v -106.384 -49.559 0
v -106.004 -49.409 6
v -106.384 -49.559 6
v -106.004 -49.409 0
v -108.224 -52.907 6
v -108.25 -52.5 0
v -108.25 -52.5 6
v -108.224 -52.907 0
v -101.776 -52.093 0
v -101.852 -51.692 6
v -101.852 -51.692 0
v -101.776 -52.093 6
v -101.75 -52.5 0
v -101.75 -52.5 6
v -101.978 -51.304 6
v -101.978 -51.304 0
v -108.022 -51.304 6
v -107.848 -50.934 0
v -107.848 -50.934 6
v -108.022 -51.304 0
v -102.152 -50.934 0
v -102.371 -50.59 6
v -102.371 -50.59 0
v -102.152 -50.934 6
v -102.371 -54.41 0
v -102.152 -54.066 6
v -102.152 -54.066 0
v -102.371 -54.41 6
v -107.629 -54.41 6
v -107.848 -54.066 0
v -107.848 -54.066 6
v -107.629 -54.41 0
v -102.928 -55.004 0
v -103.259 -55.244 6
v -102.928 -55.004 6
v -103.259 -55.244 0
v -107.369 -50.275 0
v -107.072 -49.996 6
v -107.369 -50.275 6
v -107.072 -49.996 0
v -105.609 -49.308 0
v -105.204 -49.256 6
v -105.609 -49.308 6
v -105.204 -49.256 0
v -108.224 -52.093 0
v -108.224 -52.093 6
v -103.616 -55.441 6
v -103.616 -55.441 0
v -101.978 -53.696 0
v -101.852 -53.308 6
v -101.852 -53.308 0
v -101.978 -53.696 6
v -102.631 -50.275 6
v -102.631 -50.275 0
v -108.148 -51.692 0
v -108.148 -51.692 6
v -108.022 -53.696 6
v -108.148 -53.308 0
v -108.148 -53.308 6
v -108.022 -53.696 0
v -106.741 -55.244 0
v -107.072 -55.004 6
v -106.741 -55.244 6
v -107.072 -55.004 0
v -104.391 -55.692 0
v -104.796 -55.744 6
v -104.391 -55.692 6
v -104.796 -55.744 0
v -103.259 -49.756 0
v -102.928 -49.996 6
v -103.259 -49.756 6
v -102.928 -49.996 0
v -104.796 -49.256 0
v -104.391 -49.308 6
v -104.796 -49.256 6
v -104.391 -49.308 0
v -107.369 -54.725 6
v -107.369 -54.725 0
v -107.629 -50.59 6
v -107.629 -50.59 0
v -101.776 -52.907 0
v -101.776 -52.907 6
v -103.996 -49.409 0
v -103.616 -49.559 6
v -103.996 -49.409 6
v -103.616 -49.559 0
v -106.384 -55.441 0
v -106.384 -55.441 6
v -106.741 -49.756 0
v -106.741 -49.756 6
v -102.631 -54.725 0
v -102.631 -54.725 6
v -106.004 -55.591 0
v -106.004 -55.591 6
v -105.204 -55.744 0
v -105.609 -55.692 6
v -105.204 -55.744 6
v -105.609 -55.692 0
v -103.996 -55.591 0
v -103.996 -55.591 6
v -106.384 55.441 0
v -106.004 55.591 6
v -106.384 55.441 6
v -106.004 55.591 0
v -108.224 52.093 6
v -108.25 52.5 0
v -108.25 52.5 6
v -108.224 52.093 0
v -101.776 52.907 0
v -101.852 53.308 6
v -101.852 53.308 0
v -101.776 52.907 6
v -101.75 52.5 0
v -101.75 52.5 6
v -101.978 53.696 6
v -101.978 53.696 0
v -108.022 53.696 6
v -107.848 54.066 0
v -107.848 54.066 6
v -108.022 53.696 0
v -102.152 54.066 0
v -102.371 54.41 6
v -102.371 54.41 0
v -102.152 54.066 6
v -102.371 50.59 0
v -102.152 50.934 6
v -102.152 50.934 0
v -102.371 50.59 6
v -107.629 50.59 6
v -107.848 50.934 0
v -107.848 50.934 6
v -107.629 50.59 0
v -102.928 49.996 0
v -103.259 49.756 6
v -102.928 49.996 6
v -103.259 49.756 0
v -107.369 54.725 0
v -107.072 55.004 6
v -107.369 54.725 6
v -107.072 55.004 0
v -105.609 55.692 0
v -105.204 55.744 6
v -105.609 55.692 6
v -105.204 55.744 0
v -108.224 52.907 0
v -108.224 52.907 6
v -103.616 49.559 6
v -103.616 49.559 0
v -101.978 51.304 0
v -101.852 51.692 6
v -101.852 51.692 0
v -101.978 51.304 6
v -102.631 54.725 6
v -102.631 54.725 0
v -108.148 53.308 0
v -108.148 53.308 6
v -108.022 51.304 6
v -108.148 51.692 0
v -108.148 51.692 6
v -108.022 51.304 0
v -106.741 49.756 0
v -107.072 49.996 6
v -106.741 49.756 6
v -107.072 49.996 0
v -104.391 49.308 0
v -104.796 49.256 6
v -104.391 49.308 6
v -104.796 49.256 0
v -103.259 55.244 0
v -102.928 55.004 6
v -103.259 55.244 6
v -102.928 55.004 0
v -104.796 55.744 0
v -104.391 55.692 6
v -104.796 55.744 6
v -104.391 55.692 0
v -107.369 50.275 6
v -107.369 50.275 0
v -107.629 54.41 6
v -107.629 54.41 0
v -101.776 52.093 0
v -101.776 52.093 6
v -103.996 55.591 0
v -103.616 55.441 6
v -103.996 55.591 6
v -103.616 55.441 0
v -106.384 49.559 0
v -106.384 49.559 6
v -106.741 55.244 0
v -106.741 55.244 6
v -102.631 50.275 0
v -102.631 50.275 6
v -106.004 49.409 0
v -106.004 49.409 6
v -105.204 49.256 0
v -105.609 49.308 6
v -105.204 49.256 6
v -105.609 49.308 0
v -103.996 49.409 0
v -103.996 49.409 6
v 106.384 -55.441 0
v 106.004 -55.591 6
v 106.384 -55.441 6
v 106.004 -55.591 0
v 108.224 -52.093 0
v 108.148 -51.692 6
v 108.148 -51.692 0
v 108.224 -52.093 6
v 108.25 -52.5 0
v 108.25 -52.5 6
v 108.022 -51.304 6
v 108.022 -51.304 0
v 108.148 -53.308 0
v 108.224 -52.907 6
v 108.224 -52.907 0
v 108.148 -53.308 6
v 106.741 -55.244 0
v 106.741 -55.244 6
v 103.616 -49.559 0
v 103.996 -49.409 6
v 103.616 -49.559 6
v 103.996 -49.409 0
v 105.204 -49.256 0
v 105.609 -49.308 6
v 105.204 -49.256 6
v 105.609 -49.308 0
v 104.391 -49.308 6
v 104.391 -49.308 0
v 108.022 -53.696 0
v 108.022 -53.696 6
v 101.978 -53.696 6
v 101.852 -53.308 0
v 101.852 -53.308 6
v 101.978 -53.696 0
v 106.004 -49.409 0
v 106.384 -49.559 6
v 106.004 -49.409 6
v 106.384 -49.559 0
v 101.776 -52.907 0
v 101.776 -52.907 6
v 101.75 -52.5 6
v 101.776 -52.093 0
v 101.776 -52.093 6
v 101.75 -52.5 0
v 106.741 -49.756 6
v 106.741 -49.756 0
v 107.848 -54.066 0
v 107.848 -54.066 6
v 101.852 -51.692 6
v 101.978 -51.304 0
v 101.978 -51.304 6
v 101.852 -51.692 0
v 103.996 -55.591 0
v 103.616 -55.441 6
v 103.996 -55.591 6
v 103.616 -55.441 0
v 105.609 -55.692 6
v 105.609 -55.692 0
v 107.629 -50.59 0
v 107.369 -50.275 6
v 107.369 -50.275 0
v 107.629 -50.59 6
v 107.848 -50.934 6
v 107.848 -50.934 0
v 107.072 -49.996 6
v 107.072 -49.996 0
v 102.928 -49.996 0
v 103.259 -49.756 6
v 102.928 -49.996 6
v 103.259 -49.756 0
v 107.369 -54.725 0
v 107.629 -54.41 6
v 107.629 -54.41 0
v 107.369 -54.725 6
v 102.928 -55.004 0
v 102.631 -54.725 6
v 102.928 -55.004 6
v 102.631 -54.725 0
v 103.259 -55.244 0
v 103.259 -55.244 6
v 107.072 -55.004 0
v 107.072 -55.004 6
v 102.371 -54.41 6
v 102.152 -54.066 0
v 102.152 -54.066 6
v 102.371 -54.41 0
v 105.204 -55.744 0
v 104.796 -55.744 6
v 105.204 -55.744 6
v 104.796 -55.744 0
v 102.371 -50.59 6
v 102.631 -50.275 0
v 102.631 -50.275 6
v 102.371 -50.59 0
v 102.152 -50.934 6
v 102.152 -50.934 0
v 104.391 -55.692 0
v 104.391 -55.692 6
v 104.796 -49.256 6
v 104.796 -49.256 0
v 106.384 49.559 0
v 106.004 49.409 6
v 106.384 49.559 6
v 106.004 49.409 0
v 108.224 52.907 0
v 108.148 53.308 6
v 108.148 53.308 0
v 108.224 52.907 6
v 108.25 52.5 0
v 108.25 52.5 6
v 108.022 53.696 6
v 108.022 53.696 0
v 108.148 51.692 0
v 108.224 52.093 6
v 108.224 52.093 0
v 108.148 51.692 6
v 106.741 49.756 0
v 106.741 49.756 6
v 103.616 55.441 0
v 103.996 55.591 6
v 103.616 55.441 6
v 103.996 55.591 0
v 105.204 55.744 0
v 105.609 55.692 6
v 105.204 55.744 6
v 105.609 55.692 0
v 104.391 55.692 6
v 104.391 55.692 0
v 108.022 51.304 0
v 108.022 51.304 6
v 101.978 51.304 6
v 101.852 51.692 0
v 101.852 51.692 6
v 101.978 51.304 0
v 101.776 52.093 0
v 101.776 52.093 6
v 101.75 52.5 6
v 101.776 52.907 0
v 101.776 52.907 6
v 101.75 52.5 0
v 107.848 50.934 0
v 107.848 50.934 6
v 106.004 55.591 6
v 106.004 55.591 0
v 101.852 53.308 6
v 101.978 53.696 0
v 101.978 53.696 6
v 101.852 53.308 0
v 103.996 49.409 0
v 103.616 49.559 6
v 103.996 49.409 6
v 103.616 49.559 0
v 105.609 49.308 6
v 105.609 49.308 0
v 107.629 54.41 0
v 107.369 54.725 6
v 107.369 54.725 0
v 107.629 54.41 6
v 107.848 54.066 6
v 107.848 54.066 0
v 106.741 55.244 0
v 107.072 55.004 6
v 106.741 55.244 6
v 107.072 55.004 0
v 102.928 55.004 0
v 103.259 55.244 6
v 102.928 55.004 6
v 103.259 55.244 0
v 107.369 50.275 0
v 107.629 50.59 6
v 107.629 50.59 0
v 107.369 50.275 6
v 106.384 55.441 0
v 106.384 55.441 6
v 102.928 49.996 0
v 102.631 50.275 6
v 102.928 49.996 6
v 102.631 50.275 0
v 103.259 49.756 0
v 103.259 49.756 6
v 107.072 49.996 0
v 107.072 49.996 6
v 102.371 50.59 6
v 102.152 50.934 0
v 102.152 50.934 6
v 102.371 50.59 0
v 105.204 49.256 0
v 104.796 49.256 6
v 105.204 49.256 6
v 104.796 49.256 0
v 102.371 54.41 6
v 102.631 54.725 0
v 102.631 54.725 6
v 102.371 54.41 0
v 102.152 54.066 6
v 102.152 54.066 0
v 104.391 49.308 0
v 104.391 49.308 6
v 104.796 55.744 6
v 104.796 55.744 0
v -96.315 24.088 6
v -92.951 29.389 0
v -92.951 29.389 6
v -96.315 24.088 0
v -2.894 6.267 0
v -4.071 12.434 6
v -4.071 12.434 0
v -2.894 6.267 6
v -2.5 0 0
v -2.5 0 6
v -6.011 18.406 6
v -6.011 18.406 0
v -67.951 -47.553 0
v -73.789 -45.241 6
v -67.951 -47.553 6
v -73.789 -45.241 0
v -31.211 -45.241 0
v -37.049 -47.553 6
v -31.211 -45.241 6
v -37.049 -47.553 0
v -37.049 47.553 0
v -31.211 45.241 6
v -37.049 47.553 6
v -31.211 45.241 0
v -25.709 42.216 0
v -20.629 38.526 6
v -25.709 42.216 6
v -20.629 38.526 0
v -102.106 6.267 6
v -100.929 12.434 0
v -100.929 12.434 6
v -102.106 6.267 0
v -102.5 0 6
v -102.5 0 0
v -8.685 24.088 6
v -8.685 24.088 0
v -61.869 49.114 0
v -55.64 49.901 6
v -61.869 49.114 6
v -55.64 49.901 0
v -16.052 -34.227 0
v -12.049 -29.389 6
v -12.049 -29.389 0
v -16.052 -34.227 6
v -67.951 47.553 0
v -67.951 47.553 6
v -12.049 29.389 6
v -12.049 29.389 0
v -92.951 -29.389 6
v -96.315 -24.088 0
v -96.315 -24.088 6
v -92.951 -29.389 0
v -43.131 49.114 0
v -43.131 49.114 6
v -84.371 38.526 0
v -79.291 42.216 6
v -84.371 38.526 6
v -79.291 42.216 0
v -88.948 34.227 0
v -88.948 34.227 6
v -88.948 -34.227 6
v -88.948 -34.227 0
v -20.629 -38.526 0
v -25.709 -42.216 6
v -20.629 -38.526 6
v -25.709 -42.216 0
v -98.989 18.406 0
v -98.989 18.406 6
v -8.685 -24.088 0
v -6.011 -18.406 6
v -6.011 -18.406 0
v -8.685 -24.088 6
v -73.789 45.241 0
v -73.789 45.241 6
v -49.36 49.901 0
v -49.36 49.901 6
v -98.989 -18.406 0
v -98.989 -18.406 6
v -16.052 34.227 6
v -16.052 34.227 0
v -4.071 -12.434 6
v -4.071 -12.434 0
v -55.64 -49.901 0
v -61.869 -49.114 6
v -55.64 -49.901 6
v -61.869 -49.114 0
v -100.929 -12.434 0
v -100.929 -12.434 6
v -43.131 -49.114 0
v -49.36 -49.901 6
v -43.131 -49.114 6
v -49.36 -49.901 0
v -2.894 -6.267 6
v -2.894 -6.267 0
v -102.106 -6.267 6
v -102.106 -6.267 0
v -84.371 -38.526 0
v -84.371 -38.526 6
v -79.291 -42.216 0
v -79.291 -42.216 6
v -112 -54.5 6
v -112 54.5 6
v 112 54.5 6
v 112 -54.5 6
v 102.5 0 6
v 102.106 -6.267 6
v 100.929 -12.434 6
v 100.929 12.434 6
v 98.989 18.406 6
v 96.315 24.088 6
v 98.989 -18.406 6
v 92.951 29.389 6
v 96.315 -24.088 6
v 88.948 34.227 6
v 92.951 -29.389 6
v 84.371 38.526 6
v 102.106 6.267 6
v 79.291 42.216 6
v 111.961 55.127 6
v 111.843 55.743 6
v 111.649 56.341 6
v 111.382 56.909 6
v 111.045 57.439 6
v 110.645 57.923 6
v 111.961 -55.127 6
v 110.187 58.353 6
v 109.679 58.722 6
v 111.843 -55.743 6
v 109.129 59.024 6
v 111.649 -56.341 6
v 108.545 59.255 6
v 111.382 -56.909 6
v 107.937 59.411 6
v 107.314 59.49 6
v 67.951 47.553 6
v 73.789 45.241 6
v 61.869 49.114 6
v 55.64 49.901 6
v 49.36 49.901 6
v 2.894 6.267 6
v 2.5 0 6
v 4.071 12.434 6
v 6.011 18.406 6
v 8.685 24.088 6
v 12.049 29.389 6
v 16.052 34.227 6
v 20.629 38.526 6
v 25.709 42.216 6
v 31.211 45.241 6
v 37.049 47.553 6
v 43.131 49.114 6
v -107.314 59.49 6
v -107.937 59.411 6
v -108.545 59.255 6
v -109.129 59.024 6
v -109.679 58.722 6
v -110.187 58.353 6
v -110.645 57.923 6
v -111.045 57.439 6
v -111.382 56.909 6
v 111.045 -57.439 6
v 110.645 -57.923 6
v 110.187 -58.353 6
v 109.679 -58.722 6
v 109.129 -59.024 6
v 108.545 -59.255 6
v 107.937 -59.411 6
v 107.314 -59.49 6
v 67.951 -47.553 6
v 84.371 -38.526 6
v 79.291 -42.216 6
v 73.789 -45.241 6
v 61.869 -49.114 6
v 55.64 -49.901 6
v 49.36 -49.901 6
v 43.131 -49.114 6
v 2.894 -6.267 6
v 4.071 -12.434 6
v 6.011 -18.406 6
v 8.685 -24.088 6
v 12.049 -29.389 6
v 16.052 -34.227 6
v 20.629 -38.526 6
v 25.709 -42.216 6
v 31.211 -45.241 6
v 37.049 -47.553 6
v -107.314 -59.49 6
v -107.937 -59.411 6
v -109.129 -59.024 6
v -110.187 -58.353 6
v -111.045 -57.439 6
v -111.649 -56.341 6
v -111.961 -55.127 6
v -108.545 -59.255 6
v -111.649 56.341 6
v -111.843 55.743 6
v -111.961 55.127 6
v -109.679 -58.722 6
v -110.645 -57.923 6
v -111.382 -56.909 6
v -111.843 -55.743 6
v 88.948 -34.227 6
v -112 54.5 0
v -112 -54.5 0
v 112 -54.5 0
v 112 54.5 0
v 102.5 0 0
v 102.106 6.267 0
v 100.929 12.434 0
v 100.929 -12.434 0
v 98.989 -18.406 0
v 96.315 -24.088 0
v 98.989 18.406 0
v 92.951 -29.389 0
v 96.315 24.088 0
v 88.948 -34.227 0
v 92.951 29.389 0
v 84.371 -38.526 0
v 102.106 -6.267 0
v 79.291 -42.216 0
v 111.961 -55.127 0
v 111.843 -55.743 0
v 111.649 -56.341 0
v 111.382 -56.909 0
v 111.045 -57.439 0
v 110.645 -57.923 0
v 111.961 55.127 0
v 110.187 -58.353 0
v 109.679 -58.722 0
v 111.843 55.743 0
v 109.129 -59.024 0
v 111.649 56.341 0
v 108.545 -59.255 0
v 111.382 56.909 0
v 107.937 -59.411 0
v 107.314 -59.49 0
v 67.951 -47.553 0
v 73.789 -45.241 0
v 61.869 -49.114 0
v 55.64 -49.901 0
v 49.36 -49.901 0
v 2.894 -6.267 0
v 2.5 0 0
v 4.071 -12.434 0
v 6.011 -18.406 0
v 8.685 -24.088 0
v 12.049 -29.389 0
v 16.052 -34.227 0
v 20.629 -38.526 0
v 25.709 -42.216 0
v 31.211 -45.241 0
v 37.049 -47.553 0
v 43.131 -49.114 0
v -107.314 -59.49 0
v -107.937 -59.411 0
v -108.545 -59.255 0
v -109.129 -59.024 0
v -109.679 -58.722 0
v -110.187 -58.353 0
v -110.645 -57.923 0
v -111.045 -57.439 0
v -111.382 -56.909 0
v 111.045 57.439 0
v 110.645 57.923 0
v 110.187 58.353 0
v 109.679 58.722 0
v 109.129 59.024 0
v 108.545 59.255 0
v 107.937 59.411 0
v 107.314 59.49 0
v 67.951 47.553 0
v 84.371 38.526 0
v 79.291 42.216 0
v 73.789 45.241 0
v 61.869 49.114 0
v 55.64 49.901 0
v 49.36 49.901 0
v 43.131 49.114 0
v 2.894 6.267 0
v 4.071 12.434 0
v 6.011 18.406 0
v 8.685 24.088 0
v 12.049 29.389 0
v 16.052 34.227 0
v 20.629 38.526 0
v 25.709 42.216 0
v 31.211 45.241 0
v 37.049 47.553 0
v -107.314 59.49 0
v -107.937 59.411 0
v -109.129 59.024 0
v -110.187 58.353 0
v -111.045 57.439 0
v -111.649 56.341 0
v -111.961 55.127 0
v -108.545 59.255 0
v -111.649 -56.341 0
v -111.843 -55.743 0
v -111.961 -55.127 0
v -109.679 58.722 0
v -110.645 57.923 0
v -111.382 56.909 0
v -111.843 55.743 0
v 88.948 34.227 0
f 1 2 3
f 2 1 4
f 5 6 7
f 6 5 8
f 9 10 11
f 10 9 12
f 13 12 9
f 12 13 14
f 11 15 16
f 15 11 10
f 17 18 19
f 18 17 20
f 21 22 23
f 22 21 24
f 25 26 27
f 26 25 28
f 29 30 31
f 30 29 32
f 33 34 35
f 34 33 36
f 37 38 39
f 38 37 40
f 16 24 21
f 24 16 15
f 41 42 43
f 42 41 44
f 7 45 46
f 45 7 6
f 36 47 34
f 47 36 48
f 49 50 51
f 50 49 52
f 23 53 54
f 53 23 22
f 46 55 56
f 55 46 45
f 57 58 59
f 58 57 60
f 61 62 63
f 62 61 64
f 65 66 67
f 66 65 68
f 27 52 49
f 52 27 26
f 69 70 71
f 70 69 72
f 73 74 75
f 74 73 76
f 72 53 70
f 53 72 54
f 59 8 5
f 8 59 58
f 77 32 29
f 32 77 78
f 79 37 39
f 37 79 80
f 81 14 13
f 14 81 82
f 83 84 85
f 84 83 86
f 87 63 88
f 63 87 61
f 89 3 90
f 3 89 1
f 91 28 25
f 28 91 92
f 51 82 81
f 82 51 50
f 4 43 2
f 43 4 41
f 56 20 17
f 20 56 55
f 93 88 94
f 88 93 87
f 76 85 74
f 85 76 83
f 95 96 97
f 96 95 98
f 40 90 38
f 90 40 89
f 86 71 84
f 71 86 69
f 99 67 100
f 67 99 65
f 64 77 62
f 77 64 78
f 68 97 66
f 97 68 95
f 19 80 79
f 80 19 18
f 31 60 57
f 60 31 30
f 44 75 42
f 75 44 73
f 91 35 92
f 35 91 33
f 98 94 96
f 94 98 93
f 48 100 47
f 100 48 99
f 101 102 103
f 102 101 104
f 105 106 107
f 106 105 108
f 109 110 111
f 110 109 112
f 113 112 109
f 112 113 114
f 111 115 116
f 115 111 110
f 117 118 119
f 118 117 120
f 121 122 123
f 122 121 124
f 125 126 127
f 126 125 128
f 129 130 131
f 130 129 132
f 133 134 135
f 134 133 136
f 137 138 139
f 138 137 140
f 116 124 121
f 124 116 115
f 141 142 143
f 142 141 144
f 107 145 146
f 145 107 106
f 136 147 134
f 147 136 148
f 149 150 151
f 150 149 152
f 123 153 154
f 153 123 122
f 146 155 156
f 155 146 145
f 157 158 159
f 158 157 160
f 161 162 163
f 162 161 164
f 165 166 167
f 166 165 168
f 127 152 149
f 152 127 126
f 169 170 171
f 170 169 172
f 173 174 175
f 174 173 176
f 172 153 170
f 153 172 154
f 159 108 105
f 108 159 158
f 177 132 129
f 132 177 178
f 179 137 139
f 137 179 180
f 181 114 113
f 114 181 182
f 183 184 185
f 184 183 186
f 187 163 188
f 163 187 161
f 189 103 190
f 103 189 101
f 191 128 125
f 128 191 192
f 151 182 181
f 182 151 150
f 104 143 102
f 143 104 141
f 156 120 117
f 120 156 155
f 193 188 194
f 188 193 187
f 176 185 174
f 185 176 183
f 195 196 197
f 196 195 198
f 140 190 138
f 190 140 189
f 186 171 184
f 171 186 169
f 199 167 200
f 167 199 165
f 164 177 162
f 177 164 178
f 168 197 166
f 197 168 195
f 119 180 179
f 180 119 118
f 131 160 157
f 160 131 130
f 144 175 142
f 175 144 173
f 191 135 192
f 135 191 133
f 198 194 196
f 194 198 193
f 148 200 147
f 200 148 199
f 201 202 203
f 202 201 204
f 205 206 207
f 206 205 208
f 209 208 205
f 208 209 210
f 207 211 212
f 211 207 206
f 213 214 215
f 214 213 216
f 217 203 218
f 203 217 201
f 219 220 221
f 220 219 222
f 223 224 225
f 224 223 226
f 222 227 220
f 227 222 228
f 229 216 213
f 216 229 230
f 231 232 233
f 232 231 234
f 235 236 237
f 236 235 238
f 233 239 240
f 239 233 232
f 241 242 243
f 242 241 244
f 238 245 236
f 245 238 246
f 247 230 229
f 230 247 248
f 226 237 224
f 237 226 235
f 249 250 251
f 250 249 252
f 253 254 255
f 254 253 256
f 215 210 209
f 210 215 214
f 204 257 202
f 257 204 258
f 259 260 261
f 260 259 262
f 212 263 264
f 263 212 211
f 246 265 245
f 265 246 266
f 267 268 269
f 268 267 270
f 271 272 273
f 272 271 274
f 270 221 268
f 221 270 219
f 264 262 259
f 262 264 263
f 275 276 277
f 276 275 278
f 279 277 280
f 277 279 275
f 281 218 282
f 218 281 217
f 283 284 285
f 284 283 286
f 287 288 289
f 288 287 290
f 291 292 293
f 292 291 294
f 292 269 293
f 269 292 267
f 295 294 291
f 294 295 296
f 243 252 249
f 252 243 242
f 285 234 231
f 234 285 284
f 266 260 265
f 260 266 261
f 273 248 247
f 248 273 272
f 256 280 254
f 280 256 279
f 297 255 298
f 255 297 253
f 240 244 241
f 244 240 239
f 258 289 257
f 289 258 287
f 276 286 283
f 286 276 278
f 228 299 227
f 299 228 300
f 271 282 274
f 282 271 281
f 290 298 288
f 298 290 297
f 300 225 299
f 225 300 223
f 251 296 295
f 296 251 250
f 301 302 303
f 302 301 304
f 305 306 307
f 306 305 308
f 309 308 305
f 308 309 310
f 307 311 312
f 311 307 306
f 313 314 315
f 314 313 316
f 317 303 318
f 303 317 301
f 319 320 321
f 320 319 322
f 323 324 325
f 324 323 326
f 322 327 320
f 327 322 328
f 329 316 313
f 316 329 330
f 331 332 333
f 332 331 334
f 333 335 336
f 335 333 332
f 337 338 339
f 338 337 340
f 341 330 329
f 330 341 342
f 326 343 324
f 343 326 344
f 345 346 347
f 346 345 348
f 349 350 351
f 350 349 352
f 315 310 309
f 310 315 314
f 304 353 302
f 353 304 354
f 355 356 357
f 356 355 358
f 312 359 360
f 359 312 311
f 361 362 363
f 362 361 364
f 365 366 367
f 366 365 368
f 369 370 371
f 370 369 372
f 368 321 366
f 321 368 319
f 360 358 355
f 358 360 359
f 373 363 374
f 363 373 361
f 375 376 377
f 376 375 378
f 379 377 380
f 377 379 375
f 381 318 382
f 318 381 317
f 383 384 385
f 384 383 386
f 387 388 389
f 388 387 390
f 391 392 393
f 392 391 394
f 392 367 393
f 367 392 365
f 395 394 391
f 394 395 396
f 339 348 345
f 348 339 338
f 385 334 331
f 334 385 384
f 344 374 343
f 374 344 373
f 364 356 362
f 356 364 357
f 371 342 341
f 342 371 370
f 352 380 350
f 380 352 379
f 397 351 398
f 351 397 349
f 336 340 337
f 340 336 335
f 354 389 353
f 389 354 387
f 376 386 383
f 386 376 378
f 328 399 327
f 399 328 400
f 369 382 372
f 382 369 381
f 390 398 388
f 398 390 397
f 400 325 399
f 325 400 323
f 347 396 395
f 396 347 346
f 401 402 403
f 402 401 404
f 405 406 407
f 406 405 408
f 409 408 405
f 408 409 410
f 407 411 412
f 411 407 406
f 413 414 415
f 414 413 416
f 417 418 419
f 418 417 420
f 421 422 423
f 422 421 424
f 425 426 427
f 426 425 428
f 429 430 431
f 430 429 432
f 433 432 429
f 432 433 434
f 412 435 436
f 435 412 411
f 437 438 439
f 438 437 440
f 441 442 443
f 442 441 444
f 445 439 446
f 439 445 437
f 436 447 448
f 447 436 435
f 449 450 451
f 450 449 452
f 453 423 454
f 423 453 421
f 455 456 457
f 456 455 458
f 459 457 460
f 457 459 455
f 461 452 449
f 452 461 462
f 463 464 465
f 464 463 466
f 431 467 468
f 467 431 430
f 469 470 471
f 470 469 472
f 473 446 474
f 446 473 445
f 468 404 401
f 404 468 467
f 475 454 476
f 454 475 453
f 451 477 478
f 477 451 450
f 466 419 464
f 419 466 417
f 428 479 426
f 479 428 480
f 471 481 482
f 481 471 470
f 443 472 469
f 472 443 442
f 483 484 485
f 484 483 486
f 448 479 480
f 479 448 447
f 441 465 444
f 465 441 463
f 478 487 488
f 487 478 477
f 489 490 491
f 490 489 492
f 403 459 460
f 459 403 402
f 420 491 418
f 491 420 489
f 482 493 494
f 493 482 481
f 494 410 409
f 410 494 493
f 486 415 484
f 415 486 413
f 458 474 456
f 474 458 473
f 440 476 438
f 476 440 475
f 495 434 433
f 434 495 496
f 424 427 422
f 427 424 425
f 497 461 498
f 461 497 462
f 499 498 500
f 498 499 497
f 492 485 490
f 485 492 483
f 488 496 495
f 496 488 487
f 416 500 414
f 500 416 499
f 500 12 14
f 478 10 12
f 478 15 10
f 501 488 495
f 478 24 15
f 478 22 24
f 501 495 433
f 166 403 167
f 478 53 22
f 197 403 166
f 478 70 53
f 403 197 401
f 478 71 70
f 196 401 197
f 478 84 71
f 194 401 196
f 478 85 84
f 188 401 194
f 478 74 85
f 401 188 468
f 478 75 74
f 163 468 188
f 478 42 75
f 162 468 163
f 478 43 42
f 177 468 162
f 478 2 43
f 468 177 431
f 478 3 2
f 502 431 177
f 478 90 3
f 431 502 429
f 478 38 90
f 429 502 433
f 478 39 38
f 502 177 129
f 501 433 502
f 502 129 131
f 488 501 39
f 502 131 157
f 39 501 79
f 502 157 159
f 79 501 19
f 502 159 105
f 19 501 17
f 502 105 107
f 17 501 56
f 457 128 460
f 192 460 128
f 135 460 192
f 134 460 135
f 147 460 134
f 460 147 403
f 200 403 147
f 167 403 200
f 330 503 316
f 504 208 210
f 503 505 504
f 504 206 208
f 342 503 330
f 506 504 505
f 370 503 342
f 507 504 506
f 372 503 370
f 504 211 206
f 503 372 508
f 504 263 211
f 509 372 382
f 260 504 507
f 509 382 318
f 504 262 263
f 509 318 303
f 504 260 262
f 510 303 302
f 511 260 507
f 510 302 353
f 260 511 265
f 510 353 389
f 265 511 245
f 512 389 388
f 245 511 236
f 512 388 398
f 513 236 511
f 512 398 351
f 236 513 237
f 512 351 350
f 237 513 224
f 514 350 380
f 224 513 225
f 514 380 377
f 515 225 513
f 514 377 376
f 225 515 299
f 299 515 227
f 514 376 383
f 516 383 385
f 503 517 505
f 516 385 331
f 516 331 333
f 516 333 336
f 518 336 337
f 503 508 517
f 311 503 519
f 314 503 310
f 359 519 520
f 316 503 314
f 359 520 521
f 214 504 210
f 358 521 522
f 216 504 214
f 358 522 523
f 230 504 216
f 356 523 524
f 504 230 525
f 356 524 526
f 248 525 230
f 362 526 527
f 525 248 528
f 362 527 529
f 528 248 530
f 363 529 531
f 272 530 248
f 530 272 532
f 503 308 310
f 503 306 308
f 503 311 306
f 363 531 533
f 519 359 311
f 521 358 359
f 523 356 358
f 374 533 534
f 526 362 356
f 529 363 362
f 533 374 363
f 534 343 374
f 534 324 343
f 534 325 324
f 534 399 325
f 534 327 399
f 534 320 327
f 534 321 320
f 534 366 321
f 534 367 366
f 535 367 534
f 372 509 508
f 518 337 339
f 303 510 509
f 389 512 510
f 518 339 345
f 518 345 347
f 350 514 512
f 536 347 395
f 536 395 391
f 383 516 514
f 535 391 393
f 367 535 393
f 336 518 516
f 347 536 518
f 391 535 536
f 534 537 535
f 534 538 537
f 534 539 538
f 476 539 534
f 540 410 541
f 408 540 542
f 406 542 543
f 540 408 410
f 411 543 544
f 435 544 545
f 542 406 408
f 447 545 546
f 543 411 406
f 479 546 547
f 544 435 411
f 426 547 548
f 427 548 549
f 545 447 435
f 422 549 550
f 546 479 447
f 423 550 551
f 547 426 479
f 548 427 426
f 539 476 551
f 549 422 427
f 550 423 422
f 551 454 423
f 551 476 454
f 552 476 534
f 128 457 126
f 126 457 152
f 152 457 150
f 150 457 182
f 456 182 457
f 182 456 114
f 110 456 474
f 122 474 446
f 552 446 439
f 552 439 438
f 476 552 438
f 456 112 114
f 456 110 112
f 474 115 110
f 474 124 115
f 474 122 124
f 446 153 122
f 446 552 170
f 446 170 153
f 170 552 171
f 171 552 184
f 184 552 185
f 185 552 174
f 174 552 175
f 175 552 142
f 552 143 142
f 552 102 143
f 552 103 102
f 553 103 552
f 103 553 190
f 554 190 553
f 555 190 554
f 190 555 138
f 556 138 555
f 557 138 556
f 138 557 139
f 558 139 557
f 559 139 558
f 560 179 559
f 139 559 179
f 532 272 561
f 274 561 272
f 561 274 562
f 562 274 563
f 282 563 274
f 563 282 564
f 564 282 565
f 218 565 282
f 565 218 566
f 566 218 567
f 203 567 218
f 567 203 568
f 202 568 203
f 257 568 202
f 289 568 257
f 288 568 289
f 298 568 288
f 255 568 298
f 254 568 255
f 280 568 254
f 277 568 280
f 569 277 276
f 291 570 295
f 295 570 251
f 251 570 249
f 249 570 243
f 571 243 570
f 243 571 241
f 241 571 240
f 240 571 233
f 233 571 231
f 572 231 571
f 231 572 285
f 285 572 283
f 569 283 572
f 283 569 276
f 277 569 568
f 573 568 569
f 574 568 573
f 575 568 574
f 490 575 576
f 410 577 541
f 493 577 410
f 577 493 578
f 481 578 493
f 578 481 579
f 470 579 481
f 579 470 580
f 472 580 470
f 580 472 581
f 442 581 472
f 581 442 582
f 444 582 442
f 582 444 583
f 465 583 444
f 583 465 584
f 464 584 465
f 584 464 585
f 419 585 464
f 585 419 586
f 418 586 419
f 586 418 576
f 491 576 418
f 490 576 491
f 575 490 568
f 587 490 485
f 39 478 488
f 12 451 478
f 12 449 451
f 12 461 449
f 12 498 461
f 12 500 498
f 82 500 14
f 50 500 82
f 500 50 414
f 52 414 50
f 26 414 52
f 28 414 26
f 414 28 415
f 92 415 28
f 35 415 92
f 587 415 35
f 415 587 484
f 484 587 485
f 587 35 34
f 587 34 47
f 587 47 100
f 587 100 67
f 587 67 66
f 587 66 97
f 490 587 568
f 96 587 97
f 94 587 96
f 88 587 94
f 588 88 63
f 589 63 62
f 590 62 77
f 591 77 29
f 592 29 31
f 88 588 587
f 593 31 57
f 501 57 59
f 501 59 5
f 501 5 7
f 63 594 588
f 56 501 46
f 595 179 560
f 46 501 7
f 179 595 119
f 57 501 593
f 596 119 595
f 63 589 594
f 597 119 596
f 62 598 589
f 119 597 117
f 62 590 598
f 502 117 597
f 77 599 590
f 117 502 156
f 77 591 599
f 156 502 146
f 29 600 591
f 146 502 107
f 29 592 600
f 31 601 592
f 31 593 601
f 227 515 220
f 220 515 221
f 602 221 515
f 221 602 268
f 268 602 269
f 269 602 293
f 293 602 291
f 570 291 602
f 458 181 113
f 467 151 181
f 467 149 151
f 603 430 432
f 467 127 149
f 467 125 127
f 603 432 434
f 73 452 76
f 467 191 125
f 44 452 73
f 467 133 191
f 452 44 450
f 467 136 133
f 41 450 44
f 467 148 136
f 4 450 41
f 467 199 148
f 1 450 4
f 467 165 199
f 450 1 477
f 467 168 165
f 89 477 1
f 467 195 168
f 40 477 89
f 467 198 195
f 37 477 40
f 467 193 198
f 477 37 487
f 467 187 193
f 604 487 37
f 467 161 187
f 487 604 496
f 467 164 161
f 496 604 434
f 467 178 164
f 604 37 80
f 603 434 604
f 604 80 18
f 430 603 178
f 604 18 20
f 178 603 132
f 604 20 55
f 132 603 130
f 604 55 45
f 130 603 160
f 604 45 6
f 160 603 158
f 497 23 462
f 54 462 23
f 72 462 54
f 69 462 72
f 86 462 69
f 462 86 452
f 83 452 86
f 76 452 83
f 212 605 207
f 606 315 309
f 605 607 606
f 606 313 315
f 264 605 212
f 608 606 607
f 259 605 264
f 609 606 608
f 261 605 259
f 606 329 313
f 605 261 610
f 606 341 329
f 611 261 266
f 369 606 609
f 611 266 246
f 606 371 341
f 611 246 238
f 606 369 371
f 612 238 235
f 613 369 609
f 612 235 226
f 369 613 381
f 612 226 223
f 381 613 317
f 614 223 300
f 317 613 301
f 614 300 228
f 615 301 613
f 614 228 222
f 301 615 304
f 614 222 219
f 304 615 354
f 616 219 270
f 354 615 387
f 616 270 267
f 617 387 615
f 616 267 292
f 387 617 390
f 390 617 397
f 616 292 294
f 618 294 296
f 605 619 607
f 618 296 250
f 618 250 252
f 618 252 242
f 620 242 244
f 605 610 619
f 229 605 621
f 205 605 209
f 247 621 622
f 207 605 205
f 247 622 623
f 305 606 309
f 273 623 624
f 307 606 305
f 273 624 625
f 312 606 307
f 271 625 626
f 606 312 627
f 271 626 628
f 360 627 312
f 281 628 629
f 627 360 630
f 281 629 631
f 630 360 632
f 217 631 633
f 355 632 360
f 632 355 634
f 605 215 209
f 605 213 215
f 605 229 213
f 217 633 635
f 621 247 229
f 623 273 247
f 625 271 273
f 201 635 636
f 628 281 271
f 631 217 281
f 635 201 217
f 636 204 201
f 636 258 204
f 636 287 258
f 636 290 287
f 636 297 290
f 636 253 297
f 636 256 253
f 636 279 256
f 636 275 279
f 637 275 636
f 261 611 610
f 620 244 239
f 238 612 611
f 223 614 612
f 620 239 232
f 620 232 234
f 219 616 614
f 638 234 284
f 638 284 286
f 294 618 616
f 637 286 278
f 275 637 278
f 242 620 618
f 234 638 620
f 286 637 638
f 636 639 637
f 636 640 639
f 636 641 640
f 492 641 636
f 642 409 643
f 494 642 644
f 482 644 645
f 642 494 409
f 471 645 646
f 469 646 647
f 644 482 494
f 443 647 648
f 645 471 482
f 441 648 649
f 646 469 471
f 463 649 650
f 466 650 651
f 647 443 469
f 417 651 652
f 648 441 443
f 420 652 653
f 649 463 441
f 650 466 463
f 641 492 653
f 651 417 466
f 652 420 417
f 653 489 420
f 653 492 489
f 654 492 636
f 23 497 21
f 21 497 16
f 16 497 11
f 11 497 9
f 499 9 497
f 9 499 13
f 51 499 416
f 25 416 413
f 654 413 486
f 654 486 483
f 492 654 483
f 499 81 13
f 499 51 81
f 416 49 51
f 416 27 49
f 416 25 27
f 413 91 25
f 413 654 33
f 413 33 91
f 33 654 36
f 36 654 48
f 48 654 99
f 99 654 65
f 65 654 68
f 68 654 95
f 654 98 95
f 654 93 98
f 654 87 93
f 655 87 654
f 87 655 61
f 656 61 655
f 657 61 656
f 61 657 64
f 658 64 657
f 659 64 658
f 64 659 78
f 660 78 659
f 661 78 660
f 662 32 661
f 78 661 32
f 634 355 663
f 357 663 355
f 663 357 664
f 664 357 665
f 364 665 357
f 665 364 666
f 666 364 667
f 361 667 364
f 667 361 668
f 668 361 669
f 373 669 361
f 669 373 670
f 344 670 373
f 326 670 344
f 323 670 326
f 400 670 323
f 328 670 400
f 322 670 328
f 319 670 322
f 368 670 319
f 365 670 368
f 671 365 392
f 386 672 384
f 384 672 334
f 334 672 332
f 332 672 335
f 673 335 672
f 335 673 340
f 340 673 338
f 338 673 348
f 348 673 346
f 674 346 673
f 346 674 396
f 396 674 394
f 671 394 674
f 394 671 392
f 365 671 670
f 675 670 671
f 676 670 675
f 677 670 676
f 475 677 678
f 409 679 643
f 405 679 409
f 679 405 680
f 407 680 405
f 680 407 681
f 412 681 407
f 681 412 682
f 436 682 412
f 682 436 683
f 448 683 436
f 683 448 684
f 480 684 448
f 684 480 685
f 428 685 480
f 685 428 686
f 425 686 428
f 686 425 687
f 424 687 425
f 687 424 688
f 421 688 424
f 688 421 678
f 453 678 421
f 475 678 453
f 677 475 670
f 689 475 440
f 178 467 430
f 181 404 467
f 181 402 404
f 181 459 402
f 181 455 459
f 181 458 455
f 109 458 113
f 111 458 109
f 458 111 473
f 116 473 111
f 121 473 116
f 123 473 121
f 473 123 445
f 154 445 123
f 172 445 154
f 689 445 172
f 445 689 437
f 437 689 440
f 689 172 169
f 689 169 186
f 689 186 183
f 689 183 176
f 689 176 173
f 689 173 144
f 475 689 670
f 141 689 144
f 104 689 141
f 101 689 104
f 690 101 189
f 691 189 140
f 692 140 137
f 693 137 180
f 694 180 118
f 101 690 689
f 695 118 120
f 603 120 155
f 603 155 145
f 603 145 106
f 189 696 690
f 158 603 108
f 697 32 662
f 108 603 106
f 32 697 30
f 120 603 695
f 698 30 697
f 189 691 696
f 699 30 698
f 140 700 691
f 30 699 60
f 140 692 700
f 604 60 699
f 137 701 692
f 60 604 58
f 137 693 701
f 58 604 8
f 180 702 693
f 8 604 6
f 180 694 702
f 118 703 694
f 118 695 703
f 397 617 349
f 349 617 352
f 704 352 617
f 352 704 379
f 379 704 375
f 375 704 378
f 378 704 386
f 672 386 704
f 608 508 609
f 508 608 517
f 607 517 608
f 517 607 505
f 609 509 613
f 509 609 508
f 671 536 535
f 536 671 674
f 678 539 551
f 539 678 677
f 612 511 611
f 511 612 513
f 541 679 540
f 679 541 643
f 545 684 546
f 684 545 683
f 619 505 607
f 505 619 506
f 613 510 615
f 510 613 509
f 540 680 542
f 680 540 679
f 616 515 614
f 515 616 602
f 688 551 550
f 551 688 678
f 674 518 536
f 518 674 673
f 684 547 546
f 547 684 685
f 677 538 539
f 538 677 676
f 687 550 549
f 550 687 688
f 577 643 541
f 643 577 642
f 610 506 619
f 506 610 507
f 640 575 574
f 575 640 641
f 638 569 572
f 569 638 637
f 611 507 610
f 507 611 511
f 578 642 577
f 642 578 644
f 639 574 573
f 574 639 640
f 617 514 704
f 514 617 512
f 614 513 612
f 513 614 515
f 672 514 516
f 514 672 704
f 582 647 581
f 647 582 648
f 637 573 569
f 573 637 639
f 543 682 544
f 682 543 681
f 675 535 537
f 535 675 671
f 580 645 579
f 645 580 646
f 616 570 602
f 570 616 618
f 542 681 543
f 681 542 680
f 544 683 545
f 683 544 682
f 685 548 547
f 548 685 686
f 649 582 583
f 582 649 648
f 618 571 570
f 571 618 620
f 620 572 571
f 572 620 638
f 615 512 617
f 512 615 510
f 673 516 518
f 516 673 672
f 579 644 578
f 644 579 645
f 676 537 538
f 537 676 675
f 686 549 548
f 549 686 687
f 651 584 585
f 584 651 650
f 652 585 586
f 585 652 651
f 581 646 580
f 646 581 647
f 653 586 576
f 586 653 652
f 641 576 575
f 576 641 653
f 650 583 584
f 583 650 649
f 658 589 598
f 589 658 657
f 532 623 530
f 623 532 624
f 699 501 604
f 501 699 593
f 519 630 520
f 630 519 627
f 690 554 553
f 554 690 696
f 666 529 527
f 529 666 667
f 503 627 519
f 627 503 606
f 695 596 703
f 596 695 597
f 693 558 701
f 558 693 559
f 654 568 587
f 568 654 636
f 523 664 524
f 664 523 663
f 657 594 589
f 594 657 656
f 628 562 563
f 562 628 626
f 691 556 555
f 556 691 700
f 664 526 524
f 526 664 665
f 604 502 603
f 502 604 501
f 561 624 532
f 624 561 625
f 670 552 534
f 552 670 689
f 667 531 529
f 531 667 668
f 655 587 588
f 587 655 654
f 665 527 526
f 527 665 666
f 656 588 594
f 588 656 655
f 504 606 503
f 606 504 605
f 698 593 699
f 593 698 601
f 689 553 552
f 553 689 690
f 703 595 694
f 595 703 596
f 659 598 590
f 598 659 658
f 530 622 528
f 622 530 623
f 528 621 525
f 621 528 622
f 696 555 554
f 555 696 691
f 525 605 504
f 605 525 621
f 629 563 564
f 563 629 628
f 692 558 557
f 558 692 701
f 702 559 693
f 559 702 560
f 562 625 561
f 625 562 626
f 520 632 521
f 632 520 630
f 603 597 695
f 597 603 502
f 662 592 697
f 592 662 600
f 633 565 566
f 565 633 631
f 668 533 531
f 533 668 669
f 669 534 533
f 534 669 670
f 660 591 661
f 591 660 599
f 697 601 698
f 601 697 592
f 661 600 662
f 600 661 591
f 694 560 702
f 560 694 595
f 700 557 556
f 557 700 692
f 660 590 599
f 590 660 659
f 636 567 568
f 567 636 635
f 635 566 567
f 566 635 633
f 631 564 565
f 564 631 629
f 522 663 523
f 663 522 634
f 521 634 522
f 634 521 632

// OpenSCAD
$fn = 50;


difference() {
	union() {
		hull() {
			translate(v = [-107.0000000000, 54.5000000000, 0]) {
				cylinder(h = 6, r = 5);
			}
			translate(v = [107.0000000000, 54.5000000000, 0]) {
				cylinder(h = 6, r = 5);
			}
			translate(v = [-107.0000000000, -54.5000000000, 0]) {
				cylinder(h = 6, r = 5);
			}
			translate(v = [107.0000000000, -54.5000000000, 0]) {
				cylinder(h = 6, r = 5);
			}
		}
	}
	union() {
		#translate(v = [-105.0000000000, -52.5000000000, -100.0000000000]) {
			cylinder(h = 200, r = 3.2500000000);
		}
		#translate(v = [-105.0000000000, 52.5000000000, -100.0000000000]) {
			cylinder(h = 200, r = 3.2500000000);
		}
		#translate(v = [105.0000000000, -52.5000000000, -100.0000000000]) {
			cylinder(h = 200, r = 3.2500000000);
		}
		#translate(v = [105.0000000000, 52.5000000000, -100.0000000000]) {
			cylinder(h = 200, r = 3.2500000000);
		}
		#translate(v = [-52.5000000000, 0, 0]) {
			cylinder(h = 6, r = 50.0000000000);
		}
		#translate(v = [52.5000000000, 0, 0]) {
			cylinder(h = 6, r = 50.0000000000);
		}
	}
}
